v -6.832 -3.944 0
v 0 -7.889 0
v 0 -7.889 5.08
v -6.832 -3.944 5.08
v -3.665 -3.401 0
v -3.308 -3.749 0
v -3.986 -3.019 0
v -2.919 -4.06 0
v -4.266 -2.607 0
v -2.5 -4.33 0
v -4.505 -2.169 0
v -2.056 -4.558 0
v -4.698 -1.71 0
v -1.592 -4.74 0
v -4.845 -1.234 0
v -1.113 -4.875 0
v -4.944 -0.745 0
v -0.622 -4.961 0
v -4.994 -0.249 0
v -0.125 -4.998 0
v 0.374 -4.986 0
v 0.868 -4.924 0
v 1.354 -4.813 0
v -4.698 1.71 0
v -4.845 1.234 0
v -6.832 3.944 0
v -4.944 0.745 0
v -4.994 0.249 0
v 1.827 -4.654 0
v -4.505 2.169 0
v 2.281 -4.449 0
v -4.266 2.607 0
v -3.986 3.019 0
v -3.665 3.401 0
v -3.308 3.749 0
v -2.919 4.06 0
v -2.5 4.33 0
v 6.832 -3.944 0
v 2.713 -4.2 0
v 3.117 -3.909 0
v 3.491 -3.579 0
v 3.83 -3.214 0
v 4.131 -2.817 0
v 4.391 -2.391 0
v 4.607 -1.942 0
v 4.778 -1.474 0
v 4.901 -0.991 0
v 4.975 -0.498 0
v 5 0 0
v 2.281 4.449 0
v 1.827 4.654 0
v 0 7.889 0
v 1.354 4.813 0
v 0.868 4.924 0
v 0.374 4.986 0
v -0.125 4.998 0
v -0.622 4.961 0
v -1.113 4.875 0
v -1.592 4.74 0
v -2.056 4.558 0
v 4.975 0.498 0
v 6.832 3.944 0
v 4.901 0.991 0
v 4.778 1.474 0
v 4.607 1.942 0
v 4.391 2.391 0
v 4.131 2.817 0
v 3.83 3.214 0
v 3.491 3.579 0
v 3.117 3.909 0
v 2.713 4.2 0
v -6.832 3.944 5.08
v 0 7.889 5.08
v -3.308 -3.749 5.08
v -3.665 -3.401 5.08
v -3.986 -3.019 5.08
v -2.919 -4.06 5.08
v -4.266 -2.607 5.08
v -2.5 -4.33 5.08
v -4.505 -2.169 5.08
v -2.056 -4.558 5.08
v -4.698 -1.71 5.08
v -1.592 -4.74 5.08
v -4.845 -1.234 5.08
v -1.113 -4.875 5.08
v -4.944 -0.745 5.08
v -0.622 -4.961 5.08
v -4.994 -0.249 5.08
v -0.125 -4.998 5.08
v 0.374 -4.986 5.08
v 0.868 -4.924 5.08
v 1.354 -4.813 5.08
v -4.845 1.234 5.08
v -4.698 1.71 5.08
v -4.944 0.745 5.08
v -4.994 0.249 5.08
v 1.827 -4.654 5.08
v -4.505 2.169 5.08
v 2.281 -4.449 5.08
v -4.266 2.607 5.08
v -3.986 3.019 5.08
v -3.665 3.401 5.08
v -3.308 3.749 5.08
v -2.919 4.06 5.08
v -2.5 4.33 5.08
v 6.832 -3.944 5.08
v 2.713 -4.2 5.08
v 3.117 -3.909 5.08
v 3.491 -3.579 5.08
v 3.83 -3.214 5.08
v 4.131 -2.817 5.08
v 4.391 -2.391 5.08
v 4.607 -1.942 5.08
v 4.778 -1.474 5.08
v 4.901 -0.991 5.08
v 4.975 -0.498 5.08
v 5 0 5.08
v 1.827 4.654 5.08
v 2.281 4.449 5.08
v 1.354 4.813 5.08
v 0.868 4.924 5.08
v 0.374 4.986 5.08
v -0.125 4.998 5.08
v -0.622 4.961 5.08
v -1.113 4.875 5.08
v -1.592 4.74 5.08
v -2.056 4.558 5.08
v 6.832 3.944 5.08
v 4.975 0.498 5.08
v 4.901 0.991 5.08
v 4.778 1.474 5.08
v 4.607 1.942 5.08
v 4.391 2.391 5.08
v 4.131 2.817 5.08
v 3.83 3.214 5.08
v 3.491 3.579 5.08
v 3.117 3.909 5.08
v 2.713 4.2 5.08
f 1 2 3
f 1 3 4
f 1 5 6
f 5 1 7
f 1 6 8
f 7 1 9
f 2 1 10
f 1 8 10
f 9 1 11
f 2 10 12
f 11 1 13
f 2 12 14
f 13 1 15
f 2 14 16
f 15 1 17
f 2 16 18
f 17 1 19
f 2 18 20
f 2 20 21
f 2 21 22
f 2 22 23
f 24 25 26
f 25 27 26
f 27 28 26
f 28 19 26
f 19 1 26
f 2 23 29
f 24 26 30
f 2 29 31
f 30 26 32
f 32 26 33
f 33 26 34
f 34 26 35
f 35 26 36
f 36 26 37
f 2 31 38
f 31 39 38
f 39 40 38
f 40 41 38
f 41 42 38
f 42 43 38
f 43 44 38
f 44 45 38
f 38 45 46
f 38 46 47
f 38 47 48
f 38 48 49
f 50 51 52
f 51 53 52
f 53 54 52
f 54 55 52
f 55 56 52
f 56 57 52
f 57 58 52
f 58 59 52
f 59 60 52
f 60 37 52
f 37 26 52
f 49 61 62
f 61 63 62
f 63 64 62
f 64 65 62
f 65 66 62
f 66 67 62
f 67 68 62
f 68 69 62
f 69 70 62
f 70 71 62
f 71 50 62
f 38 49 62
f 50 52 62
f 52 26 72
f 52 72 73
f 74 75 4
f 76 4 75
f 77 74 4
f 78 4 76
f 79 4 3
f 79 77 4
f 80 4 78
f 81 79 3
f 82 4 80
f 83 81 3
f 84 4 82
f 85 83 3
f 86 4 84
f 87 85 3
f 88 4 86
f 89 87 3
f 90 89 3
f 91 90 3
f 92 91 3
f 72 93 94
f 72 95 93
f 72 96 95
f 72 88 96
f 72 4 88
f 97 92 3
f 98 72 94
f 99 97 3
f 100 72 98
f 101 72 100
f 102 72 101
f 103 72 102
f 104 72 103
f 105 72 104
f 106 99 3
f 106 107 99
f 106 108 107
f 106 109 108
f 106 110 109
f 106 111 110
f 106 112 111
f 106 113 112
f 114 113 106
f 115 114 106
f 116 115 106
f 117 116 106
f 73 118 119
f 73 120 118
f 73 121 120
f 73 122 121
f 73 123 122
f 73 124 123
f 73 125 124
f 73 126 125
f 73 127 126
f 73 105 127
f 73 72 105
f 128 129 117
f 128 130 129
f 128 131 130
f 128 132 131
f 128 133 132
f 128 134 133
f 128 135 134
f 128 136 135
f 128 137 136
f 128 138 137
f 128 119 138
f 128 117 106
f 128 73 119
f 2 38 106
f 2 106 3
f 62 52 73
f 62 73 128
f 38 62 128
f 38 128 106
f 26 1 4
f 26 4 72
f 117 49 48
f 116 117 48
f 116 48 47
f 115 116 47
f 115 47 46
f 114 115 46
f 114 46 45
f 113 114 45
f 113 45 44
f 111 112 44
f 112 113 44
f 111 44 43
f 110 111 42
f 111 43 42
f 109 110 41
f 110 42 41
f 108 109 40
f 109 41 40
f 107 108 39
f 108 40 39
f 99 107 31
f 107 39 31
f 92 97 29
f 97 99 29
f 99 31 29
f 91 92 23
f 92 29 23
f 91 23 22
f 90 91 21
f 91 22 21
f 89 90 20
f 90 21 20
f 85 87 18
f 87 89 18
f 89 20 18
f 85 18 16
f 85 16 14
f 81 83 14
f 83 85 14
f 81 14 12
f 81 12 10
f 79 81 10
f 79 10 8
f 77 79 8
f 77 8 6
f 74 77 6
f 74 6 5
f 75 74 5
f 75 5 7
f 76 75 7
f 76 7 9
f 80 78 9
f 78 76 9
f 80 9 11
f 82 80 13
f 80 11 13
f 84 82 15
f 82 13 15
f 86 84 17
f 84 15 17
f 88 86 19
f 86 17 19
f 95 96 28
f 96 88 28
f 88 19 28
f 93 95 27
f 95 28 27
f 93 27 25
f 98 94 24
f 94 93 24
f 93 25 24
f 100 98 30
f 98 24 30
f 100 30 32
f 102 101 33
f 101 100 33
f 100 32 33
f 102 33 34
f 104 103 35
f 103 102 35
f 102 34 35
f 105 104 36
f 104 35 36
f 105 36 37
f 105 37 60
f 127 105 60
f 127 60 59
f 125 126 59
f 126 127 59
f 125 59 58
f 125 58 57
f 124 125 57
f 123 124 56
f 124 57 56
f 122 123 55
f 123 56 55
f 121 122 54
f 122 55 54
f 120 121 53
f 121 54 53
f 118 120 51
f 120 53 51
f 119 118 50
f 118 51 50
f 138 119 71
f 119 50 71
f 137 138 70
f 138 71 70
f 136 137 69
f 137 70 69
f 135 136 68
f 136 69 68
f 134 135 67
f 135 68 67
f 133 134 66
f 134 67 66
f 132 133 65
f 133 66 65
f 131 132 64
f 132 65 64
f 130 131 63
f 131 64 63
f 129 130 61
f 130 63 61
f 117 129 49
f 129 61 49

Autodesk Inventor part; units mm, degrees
ref_plane "YZ Plane" through (0, 0, 0) normal (1, 0, 0) x (0, 1, 0)
ref_plane "XZ Plane" through (0, 0, 0) normal (0, 1, 0) x (-1, 0, 0)
ref_plane "XY Plane" through (0, 0, 0) normal (0, 0, 1) x (1, 0, 0)
sketch "Sketch1" plane through (0, 0, 0) normal (0, 0, 1) x (1, 0, 0)
  circle A0 centre (0, 0) radius 5
  line L0 (0, 7.8889) -> (6.832, 3.9445)
  line L1 (6.832, 3.9445) -> (6.832, -3.9445)
  line L2 (6.832, -3.9445) -> (0, -7.8889)
  line L3 (0, -7.8889) -> (-6.832, -3.9445)
  line L4 (-6.832, -3.9445) -> (-6.832, 3.9445)
  line L5 (-6.832, 3.9445) -> (0, 7.8889)
  dimension "d0" = 10
extrude "Extrusion1" add sketch "Sketch1" along normal blind 5.08
thread "Thread1" size "7/16-14 UNC" class "2B" standard "ANSI Unified Screw Threads" full length
properties part number "Nut"
